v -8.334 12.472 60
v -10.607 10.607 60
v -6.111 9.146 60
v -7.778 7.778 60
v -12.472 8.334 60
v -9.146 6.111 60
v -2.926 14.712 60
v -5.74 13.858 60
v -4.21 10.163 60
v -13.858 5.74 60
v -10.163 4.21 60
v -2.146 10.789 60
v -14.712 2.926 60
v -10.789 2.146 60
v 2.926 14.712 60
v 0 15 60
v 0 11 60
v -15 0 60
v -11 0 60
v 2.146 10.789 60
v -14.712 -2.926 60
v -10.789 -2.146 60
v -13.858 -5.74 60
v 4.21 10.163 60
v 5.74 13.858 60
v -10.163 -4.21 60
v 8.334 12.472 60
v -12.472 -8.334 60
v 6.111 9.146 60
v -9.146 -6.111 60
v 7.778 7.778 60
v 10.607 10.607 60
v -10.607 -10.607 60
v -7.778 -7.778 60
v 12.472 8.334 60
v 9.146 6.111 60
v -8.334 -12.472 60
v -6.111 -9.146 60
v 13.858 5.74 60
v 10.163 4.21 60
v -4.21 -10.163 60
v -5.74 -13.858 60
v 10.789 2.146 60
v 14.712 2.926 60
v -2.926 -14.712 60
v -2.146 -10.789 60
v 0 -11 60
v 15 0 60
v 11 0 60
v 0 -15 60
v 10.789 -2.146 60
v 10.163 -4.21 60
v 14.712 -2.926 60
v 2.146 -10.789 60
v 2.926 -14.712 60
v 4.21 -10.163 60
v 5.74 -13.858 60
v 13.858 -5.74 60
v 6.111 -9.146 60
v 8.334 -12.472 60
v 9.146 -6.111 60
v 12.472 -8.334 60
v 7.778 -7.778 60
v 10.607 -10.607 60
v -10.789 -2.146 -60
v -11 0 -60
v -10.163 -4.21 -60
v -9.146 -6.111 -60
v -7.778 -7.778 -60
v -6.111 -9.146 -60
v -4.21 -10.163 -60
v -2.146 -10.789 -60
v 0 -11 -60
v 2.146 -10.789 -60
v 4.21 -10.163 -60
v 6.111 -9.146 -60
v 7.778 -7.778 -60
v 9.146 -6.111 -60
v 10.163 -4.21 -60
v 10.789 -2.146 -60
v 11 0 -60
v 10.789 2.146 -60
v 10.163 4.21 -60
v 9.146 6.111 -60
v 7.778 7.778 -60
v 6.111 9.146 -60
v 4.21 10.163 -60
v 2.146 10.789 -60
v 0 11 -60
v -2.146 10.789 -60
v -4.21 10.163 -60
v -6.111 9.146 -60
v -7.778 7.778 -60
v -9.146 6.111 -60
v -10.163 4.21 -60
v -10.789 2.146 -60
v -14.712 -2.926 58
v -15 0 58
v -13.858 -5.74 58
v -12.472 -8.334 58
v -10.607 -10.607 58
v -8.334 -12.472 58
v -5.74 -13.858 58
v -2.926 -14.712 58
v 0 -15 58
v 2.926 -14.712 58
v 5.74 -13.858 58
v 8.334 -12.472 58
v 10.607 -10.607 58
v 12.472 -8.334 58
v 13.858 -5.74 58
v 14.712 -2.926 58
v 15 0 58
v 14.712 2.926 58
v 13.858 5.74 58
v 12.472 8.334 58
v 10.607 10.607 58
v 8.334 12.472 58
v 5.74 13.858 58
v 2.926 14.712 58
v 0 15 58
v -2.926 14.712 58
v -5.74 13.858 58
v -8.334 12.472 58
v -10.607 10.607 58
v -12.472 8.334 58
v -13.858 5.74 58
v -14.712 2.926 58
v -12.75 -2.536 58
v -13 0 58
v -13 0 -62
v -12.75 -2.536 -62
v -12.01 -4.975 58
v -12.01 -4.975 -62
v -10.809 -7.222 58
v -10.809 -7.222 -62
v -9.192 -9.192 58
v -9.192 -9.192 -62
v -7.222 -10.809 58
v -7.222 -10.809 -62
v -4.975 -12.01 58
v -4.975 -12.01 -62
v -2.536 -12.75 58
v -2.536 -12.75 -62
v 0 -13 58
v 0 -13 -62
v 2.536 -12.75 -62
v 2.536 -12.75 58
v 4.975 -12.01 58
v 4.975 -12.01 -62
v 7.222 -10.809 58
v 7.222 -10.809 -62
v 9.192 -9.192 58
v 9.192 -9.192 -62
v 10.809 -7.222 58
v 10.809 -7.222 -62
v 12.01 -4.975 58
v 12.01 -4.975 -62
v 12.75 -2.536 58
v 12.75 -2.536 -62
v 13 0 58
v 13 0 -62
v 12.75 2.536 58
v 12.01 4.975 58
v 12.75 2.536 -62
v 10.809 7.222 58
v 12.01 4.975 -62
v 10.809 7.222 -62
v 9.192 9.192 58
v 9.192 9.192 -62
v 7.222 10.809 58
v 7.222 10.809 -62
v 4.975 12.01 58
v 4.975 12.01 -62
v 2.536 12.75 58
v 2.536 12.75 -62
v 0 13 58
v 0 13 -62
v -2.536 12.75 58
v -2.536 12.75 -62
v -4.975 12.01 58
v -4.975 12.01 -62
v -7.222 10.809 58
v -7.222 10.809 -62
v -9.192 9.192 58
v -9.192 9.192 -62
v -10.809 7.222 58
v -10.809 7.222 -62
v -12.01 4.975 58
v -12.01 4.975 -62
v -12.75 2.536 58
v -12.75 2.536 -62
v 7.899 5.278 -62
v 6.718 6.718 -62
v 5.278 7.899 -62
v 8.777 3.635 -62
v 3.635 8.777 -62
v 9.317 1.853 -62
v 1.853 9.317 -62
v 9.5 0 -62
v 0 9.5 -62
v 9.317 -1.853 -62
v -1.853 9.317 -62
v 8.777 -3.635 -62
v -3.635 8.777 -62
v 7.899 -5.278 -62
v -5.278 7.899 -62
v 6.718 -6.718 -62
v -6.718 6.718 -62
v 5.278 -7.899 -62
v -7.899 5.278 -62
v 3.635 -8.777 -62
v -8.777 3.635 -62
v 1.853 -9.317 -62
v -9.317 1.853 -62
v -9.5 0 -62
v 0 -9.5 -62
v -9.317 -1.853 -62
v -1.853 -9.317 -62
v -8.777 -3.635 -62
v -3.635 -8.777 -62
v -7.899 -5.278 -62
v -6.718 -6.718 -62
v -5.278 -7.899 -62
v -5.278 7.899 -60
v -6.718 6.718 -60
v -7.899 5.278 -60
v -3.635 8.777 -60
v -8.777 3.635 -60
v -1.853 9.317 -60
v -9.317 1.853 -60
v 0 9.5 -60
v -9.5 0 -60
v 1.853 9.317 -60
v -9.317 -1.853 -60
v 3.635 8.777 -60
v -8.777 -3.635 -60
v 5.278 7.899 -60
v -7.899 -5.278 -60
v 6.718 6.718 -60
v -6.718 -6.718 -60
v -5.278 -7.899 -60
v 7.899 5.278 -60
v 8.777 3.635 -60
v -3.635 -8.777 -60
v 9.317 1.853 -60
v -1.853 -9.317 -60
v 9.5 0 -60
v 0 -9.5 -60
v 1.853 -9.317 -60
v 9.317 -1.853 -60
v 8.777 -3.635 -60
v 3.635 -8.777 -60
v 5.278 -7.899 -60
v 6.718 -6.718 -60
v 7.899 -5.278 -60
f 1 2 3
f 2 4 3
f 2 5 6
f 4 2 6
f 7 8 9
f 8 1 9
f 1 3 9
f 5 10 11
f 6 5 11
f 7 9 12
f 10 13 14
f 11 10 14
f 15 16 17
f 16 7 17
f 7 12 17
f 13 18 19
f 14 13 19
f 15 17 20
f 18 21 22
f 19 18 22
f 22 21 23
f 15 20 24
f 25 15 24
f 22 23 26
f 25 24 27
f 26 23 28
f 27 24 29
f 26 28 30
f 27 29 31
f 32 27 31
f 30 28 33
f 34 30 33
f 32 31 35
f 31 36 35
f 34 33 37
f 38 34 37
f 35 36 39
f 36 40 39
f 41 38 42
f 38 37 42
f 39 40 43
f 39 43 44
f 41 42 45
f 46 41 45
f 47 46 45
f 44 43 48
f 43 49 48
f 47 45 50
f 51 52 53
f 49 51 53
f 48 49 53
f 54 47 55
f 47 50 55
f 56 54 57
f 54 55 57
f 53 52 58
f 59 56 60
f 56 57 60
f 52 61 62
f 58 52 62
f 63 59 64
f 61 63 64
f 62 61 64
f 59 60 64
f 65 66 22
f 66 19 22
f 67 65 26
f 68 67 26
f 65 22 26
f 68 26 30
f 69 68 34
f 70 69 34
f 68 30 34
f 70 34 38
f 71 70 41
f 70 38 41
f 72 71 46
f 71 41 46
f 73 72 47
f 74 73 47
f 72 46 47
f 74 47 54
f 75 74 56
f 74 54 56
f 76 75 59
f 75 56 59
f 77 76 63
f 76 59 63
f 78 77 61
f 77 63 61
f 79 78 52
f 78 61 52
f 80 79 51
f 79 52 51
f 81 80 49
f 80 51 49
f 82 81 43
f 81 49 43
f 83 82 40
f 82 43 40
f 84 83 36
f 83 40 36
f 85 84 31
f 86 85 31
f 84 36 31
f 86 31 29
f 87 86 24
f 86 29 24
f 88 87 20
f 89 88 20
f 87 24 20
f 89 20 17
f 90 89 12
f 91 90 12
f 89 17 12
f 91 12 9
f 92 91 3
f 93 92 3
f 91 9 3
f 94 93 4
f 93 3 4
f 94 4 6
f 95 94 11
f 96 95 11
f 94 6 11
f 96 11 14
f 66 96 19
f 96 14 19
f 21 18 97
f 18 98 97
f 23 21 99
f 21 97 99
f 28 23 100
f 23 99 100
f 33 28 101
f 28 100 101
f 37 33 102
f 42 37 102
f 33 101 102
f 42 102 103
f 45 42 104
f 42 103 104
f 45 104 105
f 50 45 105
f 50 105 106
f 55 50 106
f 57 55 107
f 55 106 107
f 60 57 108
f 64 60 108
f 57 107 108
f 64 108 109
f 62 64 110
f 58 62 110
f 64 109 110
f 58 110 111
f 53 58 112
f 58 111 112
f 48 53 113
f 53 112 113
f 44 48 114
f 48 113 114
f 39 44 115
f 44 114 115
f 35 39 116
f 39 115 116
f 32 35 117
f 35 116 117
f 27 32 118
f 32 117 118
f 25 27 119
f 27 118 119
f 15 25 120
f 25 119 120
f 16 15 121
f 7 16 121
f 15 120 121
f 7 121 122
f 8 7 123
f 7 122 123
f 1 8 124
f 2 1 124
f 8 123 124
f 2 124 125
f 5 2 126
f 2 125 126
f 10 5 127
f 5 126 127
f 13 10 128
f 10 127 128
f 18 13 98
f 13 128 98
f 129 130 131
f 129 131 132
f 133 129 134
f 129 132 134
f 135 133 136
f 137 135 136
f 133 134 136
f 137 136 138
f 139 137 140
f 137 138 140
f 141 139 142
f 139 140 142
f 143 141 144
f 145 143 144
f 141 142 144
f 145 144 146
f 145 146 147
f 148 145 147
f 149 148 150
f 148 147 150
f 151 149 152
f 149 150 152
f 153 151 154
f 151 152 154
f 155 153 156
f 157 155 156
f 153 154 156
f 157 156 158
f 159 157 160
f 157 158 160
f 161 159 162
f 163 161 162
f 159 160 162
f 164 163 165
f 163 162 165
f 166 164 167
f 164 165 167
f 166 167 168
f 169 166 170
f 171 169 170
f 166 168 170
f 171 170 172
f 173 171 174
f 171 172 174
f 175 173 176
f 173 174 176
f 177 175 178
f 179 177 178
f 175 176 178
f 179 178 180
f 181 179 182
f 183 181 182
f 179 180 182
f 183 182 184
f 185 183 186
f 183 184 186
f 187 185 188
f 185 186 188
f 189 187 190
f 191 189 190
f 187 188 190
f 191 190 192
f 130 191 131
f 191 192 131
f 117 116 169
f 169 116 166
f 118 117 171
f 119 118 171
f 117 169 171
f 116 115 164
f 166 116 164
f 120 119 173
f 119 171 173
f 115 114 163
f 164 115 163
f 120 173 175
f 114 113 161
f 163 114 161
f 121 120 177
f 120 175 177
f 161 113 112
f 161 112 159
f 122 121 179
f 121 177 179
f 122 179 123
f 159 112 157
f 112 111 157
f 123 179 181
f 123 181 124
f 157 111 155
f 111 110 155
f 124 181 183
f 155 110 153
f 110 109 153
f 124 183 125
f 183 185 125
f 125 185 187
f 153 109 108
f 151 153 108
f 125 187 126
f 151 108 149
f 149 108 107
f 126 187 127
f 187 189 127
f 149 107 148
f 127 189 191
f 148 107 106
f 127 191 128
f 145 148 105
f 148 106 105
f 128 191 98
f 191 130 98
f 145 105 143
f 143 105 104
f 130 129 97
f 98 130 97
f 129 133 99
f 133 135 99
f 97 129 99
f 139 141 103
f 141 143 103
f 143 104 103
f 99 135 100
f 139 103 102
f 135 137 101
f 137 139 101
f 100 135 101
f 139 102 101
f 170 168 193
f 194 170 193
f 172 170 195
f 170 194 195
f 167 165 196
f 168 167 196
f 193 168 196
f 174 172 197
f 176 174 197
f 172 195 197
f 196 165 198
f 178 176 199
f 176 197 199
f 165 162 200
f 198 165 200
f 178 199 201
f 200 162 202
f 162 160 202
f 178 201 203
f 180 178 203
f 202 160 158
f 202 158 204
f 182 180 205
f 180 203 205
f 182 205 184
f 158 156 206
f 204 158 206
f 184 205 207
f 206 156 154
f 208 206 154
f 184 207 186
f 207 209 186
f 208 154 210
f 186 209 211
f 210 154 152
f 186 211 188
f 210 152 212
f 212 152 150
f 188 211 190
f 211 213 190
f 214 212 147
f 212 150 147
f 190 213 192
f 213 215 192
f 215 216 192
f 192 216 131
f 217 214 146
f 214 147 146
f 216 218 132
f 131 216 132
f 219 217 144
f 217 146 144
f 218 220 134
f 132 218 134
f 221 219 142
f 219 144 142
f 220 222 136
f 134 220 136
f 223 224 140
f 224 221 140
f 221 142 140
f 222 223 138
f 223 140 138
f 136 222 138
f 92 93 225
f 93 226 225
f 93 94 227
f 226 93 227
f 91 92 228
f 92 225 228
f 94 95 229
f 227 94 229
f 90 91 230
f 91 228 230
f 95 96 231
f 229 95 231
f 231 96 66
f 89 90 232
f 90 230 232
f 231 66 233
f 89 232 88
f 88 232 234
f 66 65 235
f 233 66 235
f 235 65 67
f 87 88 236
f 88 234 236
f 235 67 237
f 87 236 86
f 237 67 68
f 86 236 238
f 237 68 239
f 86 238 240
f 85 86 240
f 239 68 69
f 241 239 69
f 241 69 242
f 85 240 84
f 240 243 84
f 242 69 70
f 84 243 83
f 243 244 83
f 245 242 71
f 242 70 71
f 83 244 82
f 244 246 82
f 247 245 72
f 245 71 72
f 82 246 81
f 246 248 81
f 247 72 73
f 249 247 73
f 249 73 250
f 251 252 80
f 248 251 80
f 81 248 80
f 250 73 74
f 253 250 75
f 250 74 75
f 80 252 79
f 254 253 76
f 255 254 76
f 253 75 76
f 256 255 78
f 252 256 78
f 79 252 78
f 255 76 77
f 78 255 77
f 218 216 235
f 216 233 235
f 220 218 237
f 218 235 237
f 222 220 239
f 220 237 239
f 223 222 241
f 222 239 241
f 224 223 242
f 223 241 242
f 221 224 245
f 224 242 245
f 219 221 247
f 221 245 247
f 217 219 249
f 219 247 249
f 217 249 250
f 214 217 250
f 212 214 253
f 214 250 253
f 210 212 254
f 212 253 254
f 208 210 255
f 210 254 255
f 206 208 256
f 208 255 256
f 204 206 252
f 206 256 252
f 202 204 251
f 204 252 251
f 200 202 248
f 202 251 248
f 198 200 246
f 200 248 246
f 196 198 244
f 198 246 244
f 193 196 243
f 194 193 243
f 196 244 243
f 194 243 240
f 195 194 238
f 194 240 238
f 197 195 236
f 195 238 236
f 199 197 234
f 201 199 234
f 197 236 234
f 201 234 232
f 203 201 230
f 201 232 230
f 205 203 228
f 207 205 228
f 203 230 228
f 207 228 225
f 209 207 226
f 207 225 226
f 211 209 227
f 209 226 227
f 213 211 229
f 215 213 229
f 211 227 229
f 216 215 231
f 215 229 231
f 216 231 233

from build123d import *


with BuildPart() as part:
    # Croquis1 → Revolución1 (revolve)
    with BuildSketch(Plane.YZ, mode=Mode.PRIVATE) as revoluci_n1_sk:
        Polygon((11, -60), (11, 60), (15, 60), (15, 58), (13, 58), (13, -62), (9.5, -62), (9.5, -60), align=None)
    revolve(revoluci_n1_sk.sketch.rotate(Axis((0, 0, 0), (0, 0, 1)), 90), axis=Axis((0, 0, 0), (0, 0, 1)))


solid = part.part
